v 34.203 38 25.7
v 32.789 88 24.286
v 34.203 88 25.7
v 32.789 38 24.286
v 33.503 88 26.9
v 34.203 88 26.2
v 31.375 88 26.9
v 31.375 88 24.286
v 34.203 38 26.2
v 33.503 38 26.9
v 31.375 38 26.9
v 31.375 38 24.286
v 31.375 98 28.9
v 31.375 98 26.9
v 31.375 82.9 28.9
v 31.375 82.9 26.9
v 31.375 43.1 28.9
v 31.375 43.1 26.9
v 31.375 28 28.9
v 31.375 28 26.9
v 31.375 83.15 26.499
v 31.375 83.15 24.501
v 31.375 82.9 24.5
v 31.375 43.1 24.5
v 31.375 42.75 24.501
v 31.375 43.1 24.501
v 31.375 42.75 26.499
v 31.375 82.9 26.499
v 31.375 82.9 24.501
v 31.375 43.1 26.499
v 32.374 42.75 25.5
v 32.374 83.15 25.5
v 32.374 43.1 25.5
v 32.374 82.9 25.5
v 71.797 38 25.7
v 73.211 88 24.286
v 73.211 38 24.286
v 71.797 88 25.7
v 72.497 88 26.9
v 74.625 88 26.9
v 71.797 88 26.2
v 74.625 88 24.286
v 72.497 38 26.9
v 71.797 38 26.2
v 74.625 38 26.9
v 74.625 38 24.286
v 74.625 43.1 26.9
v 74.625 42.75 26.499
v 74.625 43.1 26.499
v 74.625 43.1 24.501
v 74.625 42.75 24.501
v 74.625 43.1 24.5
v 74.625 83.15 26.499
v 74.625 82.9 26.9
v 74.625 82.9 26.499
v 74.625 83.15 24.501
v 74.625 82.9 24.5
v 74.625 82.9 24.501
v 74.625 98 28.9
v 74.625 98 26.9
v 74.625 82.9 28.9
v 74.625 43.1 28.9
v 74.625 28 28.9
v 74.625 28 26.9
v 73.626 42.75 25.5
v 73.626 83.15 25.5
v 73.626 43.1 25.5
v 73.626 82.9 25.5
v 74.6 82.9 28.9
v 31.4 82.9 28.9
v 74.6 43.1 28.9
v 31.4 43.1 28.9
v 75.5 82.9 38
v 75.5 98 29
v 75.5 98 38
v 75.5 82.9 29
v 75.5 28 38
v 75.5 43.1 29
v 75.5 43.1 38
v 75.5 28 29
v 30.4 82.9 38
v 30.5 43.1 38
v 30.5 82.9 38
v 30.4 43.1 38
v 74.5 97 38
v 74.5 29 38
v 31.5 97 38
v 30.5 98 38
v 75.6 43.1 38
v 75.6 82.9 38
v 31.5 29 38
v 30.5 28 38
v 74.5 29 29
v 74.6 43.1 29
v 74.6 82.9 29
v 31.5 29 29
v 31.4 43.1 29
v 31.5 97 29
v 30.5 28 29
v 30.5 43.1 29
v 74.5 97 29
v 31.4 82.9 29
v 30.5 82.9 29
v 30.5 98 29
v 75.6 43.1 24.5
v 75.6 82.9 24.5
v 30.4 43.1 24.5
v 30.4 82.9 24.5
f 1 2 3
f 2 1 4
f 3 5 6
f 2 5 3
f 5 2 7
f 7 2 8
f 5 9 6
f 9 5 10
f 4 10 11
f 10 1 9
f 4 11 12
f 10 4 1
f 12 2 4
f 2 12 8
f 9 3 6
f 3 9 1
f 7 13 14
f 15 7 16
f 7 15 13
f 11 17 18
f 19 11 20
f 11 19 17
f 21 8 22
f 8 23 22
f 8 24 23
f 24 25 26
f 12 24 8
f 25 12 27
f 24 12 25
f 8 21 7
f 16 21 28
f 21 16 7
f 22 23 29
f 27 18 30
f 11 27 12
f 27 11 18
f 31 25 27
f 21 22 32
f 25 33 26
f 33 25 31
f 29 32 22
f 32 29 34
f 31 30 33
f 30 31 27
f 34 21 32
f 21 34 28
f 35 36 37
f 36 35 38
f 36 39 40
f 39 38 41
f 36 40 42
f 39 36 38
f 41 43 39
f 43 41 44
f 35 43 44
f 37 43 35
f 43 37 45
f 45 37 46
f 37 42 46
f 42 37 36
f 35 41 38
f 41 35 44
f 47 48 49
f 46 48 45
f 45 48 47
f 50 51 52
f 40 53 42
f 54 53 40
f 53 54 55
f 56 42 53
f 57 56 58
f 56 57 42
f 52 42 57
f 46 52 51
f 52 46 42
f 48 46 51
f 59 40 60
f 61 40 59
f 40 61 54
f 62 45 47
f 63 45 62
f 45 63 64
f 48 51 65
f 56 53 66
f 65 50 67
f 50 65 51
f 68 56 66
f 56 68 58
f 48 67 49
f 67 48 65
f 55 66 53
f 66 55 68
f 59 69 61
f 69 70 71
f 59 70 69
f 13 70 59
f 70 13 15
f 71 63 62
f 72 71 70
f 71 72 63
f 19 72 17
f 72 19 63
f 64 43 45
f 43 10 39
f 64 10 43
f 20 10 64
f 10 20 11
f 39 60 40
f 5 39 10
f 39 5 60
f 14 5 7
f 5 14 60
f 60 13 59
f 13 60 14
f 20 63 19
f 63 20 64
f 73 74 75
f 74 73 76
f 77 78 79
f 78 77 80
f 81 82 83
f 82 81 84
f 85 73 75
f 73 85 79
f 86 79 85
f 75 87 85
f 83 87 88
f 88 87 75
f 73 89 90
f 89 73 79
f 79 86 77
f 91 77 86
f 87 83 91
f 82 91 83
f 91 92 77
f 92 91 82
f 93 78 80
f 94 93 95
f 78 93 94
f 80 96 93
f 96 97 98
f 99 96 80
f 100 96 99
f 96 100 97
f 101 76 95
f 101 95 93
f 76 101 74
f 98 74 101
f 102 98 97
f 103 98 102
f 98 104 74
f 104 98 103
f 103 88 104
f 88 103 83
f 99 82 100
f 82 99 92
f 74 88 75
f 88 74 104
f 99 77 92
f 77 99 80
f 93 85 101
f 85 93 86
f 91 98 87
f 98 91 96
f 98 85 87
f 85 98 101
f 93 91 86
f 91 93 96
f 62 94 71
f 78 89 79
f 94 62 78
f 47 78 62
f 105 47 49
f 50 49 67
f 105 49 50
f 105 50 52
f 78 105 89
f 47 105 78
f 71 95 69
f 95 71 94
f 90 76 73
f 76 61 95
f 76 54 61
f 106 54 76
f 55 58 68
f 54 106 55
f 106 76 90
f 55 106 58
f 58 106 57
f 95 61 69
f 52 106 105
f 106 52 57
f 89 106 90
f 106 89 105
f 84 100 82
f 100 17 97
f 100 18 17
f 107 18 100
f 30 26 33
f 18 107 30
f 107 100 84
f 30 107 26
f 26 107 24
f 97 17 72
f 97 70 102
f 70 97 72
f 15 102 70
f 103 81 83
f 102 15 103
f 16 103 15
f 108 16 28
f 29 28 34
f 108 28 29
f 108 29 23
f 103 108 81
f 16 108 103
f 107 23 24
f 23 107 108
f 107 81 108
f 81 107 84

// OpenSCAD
// file: spring.scad
$fn =50;

module simi_c(w,t,h){
difference(){
    cylinder(h =h,r=w/2);
    translate([0,0,-0.5])cylinder(h =h+1,r=w/2-t);
    translate([-w/2,0+0.1,-0.5])cube([w,w/2,h+1]);
        }
    }
module spring(w,t,h,n)
{
    
    for(i = [0:n-1])
    {
translate([(w-t)*i,0,0])mirror([0,i%2,0])simi_c(w,t,h);        
        
        
        }
    }


spring(3,0.5,0.2,10);
// file: slot.scad
w=3;
h =8;
t=1;
module slot(w,h,t,l) {
 
points = [[0,0],[0,h/2],[w,h/2],[w,(h/2)-t],[t,((h/2)-t)-(w-t)], [t,0]];
linear_extrude(height = l) union() {
    mirror(v = [0,1,0]) polygon(points = points);
    polygon(points = points);
}
 
}
slot(w,h,t,10);
// file: flex_cover.scad
module cover_flex(w,h,l,g)
{
union(){
    cube([w,1,h],false);
    if(l == 0)
        {
            cube([1,g,h]);
            }

else if(l == 1)
    {
            translate([w-1,0,0])cube([1,g,h]);
        
        }    
    
    }
        }

g= 1.6;
n = 21;
l = 30;
t = 0.3;
h =1.5;

//flexiable_cover(n,l,h,g,t);
  flexiable_cover(n = 23, l = 18, h = 1, g = 1.6, t = 0.3);      
module flexiable_cover(n,l,h,g,t) {
  union(){

    translate(v = [0,-g,0]) for (a =[1:n]){translate([0,a*g,t]){
    if(a !=n )
        cover_flex(l,h,a%2,g);
    else
        cover_flex(l,h,-12,g);
    }
    }
    
    cube([l,(n-0.5)*g,t],false);
    translate([l/2,0,0]) rotate([-90,0,0])difference(){
    cylinder(h=1,r=4);
    translate([0,2.5,0])cube([50,5,5],true);
    }
}
}
// file: button_cap.scad
//$fs = 1;

//$fa = 0.1;

use <spring.scad>

module button_cap2(h){
$fn = 200;
union(){
translate([0,0,-h-5])cylinder(h,4.5,4.5);
translate([0,0,-5])difference(){

cylinder(5+2,1.45,1.45);

translate([0,0,-1])cylinder(12,0.7,0.7);

}

mirror([0,0,0])translate([-1.5,1.8,-5])cube([3,2,2.5+5]);
mirror([0,1,0])translate([-1.5,1.8,-5])cube([3,2,2.5+5]);
mirror([1,1,0])translate([-1.5,1.8,-5])cube([3,2,2.5+5]);
mirror([1,1,0])mirror([0,1,0])translate([-1.5,1.8,-5])cube([3,2,2.5+5]);

}

}

module button_cap(h){
$fn = 200;
union(){
    
difference(h){

cylinder(h,1.45,1.45);

translate([0,0,-2])cylinder(h,0.7,0.7);

}
}

}
module button_cap_S(h,n,d,t=0.5,w = 0.5){
button_cap(h);
for(i = [0:n]){
rotate([0,0,d*i])translate([2.5,0,h-1]){translate([0,0,1-t])spring(2,w,t,3);

translate([-2.5,-0.5,1-t])cube([2,1,t]);
}
}}


button_cap_S(40,5,60);
// file: COVER.scad
$fs = 0.1;
$fn =30;

cover_length = 80;
cover_width = 35;
cover_thickness = 2.1;
Resolution = 50;

module test_locking(){
    //  the source link for the Testpiece.stl file https://www.thingiverse.com/thing:3660535/remixes
    difference(){
translate([6,-83,-25])import("Testpiece.stl",convexity=10);

    difference(){
        translate([0,0,-15])cylinder(h = 30, r = 50);
        translate([0,0,-16])cylinder(h = 35, r = 8);
    }
}

}

module lock(w,h,h2,l,tip){

points = [[0,0],[0,h],[-h2,h+h2],[-h2,h+h2+tip],[w,h+h2+tip],[w,0]];
linear_extrude(l)polygon(points);
}


difference(){cover_unit();
    translate([50,17.5,0])translate([0,0,-16])cylinder(h = 22, r = 7.9);
}
translate([50,17.5,0]){rotate([0,0,180])mirror([0,0,1])scale([1,1,1])test_locking();
    }

module round_hull(r,w)
{
    
$fn=Resolution;
hull()
{
    circle(r);
    translate([w,0,0,])circle(r);
    }    
    
    }
module drafted_pin(radius, hieght)
{
    

c1 = radius;
h = hieght;
c2 =(h < c1)? c1 - h : 0;

cylinder(h,c1,c2);    
    
    }

 module s_cover(width,length,thickness){
    
     
     
     
     union(){ difference()
    {
    linear_extrude(thickness)round_hull(width/2,length-width);
   translate([width/4+(length-width),0,0])cube([width/2,width,10],true);
   translate([-width/4,0,0])cube([width/2,width,10],true);
   
     
        } 
        thickness2 = 0.5;
        width2 = 29.7;
       
            translate([(length-width),0,0]){
                cylinder(h=thickness,r1 = width/2, r2 =width/2-(sqrt(2)*thickness));
            
            }
        
        }
    }   
module cover(width,length,thickness)
{
module joint()
        {        
            rotate([90,0,0])translate([3,4,0])drafted_pin(3,2);
            }
     
          
Resolution = 50;
            

 union(){union(){       
translate([0,width/2,0])  
    s_cover(width,length,thickness);
     

   rotate([90,0,0])translate([3,4,-width])cylinder(width,4,4);
  
        joint();
        
 }mirror([0,1,0])translate([0,-width,0]) joint();}
        
 
 }
        

module locking(w = 1, h = 1)
{
    points = [[-5,0],[-5,h],[h,h],[0,0]];
    rotate_extrude(angle = 180)translate([w,0,0])mirror([1,0,0])polygon(points);

}



module cover_unit(){

difference(){union(){
union()
{
    
translate([-15,-10,0]) cube([cover_length+7,cover_width+20,2.1]);
translate([-2,-10,2])cube([10,10,6.5]);    

}
translate([0,cover_width,0])mirror([0,1,0]){translate([-2,-10,2])cube([10,10,6.5]);}
}
door_back_gap = 0.4;
translate([-door_back_gap,0,0])cube([door_back_gap,cover_width,3]);

translate([0.5,35,0])mirror([0,1,0])rotate([90,0,0])translate([3,4,0])drafted_pin(3+0.15,2+0.15); 
rotate([90,0,0])translate([3.5,4,0])drafted_pin(3+0.15,2+0.15);

color("green"){cover(cover_width,cover_length,cover_thickness);}
}

translate([cover_length-16.8,cover_width/2+5,0])rotate([90,0,0])lock(w = 10,h =4.8,h2 = 8, l = 15,tip=0.5);

translate([0.5,0.25,0])color("blue"){cover(cover_width-0.5,cover_length-1.2,cover_thickness);}


}
// main file
 ACB_x = 38.77-5;
ACB_y = 42.44;
ACB_z = 40;
AC_button_x = 38.77;
AC_button_y = 44.44;

use <COVER.scad>

use <button_cap.scad>
use <flex_cover.scad>
use <slot.scad>



//translate([AC_button_x,AC_button_y,25])button_cap_S(5.175,5,60);

//translate([33,32,40])rotate([180,0,90])cover_unit();
//cover_slot();
/*
module cover_slot() {
 
translate(v = [46.3,44,24.8]) flexiable_cover(n = 23, l = 18, h = 1, g = 1.6, t = 0.3);
gap = -10;
slot_w = 1.3;
slot_h = 3;
slot_t = 0.5;
slot_l = 50;
difference(){union(){
translate([55.3,90,25.5]){

mirror(v = [1,0,0]) translate([gap,0,0]) rotate([90,0,0]) slot(w = slot_w, h = slot_h, t = slot_t, l = slot_l);
translate([gap,0,0]) rotate([90,0,0]) slot(w = slot_w, h = slot_h, t = slot_t, l = slot_l);

}
}
translate([45.2,48,0])cube([20.2,4,50]);
  
} 
}
*/
w_p = 2;
h_p = 50;
l_p = 0.5;


r_w = 45;
r_l = 70;
r_h = 9;
r_t = 2;

module reccessed(w,l,h,t)
{

difference(){    
    translate([w/2,l/2,h/2])
    difference(){
    cube([w,l,h], true);    
    translate([0,0,0])cube([w-t,l-t,h+t], true);  
        
        
        
    }
    //translate([-1,15,-11+0.4])cube([w+2,40,16],false);
}

}






under_r_x = 30.5-2;
under_r_y = 28;
under_r_z = 38-r_h-r_t-0.1;






snap_l = r_h+4.5;
snap_h = 2;
snap_w = snap_h/2;

difference(){
union(){
translate([0,0,0])reccesed_f();
reccessed_bottom_f();
}
//cube(50);
//translate([0,70,0])cube(50);

}

module hh(){
  difference(){
    reccesed_f();
      translate([AC_button_x,AC_button_y,25])cylinder(r=6,h=10);
    translate([AC_button_x,AC_button_y+29.67,25])cylinder(r=6,h=10);  
      
          translate([AC_button_x+8,AC_button_y,26.5])
      {
          cube([17,35,3]);
          
          } 
          translate([45.2,48,0])cube([20.2,4,50]);
      }
      AC_buttons_pins2(s_t = 0.5, s_w =0.5);
      
//translate([AC_button_x+24.98,AC_button_y+34.8,28.9])rotate([0,0,180])rotate([0,180,270])cover2(17,44,2);
//reccessed_bottom_f();

}
difference(){
   // hh();
//cube([50,50,50]);
}
//reccesed_f();

difference()
{
union(){
//reccessed_bottom_f();
//reccesed_f();
}    
 //cube([500,60,80]);   
    }

module reccesed_f(){
R_clearance = 1.75;
translate([under_r_x+2+(R_clearance/2),under_r_y,under_r_z])cube([r_w-R_clearance,r_l,r_t], false);
    translate([R_clearance/2,0,-0.8])add_supp_snap();
translate([62-(R_clearance/2)+r_w,0,-0.8])mirror([1,0,0])translate([1,0,0])add_supp_snap();
}
 
 module reccessed_bottom_f(R_height = r_h){
    union(){
    translate([30.5,28,38-R_height])reccessed(r_w,r_l,R_height,r_t);
        
rotate([0,180,0])translate([-70.5,43,-38]){translate([40-(r_w)-0.1,0.1,0])snap(snap_h,snap_w,40-0.2,R_height+4.5,1);
    translate([0.1,0.1,0])mirror([1,0,0])translate([-40,0,0]) snap(snap_h,snap_w,40-0.2,R_height+4.5,1);
    }
    //translate([0,0,15-r_h])add_supp_snap();
    //translate([100+1,0,15-r_h])mirror([1,0,0])translate([0,0,0])add_supp_snap();
    }
    
}
    //add_supp_snap();
    module add_supp_snap(){
    difference(){
    translate([30.5,38,27])supp_snap();
translate([under_r_x-0.001,under_r_y+15,under_r_z-r_h-5])translate([2,25,6.4])scale([1,1.01,1])translate([-2,-25,-5.5])snap(snap_h,snap_w,40,snap_l,2);
        }
    }
        
      
module  supp_snap(){
difference(){
hull(){
hull(){
rotate([0,45,0])cube([w_p,h_p,w_p]);
translate([0,0,-l_p])rotate([0,45,0])cube([w_p,h_p,w_p]);}
translate([-2,0,0])hull(){
rotate([0,45,0])cube([w_p,h_p,w_p]);
translate([0,0,-l_p])rotate([0,45,0])cube([w_p,h_p,w_p]);}
}
translate([-3,-1,-20])cube([w_p+1,h_p+2,50],false);

}
}

 module snap(w = 100,h, t,l,thick)
       {
           
           translate([0,0,l])rotate([90,270,180])mirror([1,0,0])union(){
           translate([0,thick,0])linear_extrude(t)polygon(points=[[0,0],[w,0],[w/2,h]]);       
    cube([l,thick,t],false);
   }
   }
   
module round_hull(r,w)
{
    
$fn=50;
hull()
{
    circle(r);
    translate([w,0,0,])circle(r);
    }    
    
    }
    
module AC_buttons_pins2(s_t = 0.5,s_w = 0.5, scale_s = 1, B_height = 4.57)
{
    translate([AC_button_x,AC_button_y,ACB_z-15.67+4.57-B_height])translate([0,0,5])translate([0,0,-5])button_cap_S(B_height,5,60,t=s_t,w =s_w);
    
    
        translate([AC_button_x,AC_button_y+29.67,ACB_z-15.67+4.57-B_height])translate([0,0,5])translate([0,0,-5])button_cap_S(B_height,5,60,t = s_t, w =s_w);
    }
